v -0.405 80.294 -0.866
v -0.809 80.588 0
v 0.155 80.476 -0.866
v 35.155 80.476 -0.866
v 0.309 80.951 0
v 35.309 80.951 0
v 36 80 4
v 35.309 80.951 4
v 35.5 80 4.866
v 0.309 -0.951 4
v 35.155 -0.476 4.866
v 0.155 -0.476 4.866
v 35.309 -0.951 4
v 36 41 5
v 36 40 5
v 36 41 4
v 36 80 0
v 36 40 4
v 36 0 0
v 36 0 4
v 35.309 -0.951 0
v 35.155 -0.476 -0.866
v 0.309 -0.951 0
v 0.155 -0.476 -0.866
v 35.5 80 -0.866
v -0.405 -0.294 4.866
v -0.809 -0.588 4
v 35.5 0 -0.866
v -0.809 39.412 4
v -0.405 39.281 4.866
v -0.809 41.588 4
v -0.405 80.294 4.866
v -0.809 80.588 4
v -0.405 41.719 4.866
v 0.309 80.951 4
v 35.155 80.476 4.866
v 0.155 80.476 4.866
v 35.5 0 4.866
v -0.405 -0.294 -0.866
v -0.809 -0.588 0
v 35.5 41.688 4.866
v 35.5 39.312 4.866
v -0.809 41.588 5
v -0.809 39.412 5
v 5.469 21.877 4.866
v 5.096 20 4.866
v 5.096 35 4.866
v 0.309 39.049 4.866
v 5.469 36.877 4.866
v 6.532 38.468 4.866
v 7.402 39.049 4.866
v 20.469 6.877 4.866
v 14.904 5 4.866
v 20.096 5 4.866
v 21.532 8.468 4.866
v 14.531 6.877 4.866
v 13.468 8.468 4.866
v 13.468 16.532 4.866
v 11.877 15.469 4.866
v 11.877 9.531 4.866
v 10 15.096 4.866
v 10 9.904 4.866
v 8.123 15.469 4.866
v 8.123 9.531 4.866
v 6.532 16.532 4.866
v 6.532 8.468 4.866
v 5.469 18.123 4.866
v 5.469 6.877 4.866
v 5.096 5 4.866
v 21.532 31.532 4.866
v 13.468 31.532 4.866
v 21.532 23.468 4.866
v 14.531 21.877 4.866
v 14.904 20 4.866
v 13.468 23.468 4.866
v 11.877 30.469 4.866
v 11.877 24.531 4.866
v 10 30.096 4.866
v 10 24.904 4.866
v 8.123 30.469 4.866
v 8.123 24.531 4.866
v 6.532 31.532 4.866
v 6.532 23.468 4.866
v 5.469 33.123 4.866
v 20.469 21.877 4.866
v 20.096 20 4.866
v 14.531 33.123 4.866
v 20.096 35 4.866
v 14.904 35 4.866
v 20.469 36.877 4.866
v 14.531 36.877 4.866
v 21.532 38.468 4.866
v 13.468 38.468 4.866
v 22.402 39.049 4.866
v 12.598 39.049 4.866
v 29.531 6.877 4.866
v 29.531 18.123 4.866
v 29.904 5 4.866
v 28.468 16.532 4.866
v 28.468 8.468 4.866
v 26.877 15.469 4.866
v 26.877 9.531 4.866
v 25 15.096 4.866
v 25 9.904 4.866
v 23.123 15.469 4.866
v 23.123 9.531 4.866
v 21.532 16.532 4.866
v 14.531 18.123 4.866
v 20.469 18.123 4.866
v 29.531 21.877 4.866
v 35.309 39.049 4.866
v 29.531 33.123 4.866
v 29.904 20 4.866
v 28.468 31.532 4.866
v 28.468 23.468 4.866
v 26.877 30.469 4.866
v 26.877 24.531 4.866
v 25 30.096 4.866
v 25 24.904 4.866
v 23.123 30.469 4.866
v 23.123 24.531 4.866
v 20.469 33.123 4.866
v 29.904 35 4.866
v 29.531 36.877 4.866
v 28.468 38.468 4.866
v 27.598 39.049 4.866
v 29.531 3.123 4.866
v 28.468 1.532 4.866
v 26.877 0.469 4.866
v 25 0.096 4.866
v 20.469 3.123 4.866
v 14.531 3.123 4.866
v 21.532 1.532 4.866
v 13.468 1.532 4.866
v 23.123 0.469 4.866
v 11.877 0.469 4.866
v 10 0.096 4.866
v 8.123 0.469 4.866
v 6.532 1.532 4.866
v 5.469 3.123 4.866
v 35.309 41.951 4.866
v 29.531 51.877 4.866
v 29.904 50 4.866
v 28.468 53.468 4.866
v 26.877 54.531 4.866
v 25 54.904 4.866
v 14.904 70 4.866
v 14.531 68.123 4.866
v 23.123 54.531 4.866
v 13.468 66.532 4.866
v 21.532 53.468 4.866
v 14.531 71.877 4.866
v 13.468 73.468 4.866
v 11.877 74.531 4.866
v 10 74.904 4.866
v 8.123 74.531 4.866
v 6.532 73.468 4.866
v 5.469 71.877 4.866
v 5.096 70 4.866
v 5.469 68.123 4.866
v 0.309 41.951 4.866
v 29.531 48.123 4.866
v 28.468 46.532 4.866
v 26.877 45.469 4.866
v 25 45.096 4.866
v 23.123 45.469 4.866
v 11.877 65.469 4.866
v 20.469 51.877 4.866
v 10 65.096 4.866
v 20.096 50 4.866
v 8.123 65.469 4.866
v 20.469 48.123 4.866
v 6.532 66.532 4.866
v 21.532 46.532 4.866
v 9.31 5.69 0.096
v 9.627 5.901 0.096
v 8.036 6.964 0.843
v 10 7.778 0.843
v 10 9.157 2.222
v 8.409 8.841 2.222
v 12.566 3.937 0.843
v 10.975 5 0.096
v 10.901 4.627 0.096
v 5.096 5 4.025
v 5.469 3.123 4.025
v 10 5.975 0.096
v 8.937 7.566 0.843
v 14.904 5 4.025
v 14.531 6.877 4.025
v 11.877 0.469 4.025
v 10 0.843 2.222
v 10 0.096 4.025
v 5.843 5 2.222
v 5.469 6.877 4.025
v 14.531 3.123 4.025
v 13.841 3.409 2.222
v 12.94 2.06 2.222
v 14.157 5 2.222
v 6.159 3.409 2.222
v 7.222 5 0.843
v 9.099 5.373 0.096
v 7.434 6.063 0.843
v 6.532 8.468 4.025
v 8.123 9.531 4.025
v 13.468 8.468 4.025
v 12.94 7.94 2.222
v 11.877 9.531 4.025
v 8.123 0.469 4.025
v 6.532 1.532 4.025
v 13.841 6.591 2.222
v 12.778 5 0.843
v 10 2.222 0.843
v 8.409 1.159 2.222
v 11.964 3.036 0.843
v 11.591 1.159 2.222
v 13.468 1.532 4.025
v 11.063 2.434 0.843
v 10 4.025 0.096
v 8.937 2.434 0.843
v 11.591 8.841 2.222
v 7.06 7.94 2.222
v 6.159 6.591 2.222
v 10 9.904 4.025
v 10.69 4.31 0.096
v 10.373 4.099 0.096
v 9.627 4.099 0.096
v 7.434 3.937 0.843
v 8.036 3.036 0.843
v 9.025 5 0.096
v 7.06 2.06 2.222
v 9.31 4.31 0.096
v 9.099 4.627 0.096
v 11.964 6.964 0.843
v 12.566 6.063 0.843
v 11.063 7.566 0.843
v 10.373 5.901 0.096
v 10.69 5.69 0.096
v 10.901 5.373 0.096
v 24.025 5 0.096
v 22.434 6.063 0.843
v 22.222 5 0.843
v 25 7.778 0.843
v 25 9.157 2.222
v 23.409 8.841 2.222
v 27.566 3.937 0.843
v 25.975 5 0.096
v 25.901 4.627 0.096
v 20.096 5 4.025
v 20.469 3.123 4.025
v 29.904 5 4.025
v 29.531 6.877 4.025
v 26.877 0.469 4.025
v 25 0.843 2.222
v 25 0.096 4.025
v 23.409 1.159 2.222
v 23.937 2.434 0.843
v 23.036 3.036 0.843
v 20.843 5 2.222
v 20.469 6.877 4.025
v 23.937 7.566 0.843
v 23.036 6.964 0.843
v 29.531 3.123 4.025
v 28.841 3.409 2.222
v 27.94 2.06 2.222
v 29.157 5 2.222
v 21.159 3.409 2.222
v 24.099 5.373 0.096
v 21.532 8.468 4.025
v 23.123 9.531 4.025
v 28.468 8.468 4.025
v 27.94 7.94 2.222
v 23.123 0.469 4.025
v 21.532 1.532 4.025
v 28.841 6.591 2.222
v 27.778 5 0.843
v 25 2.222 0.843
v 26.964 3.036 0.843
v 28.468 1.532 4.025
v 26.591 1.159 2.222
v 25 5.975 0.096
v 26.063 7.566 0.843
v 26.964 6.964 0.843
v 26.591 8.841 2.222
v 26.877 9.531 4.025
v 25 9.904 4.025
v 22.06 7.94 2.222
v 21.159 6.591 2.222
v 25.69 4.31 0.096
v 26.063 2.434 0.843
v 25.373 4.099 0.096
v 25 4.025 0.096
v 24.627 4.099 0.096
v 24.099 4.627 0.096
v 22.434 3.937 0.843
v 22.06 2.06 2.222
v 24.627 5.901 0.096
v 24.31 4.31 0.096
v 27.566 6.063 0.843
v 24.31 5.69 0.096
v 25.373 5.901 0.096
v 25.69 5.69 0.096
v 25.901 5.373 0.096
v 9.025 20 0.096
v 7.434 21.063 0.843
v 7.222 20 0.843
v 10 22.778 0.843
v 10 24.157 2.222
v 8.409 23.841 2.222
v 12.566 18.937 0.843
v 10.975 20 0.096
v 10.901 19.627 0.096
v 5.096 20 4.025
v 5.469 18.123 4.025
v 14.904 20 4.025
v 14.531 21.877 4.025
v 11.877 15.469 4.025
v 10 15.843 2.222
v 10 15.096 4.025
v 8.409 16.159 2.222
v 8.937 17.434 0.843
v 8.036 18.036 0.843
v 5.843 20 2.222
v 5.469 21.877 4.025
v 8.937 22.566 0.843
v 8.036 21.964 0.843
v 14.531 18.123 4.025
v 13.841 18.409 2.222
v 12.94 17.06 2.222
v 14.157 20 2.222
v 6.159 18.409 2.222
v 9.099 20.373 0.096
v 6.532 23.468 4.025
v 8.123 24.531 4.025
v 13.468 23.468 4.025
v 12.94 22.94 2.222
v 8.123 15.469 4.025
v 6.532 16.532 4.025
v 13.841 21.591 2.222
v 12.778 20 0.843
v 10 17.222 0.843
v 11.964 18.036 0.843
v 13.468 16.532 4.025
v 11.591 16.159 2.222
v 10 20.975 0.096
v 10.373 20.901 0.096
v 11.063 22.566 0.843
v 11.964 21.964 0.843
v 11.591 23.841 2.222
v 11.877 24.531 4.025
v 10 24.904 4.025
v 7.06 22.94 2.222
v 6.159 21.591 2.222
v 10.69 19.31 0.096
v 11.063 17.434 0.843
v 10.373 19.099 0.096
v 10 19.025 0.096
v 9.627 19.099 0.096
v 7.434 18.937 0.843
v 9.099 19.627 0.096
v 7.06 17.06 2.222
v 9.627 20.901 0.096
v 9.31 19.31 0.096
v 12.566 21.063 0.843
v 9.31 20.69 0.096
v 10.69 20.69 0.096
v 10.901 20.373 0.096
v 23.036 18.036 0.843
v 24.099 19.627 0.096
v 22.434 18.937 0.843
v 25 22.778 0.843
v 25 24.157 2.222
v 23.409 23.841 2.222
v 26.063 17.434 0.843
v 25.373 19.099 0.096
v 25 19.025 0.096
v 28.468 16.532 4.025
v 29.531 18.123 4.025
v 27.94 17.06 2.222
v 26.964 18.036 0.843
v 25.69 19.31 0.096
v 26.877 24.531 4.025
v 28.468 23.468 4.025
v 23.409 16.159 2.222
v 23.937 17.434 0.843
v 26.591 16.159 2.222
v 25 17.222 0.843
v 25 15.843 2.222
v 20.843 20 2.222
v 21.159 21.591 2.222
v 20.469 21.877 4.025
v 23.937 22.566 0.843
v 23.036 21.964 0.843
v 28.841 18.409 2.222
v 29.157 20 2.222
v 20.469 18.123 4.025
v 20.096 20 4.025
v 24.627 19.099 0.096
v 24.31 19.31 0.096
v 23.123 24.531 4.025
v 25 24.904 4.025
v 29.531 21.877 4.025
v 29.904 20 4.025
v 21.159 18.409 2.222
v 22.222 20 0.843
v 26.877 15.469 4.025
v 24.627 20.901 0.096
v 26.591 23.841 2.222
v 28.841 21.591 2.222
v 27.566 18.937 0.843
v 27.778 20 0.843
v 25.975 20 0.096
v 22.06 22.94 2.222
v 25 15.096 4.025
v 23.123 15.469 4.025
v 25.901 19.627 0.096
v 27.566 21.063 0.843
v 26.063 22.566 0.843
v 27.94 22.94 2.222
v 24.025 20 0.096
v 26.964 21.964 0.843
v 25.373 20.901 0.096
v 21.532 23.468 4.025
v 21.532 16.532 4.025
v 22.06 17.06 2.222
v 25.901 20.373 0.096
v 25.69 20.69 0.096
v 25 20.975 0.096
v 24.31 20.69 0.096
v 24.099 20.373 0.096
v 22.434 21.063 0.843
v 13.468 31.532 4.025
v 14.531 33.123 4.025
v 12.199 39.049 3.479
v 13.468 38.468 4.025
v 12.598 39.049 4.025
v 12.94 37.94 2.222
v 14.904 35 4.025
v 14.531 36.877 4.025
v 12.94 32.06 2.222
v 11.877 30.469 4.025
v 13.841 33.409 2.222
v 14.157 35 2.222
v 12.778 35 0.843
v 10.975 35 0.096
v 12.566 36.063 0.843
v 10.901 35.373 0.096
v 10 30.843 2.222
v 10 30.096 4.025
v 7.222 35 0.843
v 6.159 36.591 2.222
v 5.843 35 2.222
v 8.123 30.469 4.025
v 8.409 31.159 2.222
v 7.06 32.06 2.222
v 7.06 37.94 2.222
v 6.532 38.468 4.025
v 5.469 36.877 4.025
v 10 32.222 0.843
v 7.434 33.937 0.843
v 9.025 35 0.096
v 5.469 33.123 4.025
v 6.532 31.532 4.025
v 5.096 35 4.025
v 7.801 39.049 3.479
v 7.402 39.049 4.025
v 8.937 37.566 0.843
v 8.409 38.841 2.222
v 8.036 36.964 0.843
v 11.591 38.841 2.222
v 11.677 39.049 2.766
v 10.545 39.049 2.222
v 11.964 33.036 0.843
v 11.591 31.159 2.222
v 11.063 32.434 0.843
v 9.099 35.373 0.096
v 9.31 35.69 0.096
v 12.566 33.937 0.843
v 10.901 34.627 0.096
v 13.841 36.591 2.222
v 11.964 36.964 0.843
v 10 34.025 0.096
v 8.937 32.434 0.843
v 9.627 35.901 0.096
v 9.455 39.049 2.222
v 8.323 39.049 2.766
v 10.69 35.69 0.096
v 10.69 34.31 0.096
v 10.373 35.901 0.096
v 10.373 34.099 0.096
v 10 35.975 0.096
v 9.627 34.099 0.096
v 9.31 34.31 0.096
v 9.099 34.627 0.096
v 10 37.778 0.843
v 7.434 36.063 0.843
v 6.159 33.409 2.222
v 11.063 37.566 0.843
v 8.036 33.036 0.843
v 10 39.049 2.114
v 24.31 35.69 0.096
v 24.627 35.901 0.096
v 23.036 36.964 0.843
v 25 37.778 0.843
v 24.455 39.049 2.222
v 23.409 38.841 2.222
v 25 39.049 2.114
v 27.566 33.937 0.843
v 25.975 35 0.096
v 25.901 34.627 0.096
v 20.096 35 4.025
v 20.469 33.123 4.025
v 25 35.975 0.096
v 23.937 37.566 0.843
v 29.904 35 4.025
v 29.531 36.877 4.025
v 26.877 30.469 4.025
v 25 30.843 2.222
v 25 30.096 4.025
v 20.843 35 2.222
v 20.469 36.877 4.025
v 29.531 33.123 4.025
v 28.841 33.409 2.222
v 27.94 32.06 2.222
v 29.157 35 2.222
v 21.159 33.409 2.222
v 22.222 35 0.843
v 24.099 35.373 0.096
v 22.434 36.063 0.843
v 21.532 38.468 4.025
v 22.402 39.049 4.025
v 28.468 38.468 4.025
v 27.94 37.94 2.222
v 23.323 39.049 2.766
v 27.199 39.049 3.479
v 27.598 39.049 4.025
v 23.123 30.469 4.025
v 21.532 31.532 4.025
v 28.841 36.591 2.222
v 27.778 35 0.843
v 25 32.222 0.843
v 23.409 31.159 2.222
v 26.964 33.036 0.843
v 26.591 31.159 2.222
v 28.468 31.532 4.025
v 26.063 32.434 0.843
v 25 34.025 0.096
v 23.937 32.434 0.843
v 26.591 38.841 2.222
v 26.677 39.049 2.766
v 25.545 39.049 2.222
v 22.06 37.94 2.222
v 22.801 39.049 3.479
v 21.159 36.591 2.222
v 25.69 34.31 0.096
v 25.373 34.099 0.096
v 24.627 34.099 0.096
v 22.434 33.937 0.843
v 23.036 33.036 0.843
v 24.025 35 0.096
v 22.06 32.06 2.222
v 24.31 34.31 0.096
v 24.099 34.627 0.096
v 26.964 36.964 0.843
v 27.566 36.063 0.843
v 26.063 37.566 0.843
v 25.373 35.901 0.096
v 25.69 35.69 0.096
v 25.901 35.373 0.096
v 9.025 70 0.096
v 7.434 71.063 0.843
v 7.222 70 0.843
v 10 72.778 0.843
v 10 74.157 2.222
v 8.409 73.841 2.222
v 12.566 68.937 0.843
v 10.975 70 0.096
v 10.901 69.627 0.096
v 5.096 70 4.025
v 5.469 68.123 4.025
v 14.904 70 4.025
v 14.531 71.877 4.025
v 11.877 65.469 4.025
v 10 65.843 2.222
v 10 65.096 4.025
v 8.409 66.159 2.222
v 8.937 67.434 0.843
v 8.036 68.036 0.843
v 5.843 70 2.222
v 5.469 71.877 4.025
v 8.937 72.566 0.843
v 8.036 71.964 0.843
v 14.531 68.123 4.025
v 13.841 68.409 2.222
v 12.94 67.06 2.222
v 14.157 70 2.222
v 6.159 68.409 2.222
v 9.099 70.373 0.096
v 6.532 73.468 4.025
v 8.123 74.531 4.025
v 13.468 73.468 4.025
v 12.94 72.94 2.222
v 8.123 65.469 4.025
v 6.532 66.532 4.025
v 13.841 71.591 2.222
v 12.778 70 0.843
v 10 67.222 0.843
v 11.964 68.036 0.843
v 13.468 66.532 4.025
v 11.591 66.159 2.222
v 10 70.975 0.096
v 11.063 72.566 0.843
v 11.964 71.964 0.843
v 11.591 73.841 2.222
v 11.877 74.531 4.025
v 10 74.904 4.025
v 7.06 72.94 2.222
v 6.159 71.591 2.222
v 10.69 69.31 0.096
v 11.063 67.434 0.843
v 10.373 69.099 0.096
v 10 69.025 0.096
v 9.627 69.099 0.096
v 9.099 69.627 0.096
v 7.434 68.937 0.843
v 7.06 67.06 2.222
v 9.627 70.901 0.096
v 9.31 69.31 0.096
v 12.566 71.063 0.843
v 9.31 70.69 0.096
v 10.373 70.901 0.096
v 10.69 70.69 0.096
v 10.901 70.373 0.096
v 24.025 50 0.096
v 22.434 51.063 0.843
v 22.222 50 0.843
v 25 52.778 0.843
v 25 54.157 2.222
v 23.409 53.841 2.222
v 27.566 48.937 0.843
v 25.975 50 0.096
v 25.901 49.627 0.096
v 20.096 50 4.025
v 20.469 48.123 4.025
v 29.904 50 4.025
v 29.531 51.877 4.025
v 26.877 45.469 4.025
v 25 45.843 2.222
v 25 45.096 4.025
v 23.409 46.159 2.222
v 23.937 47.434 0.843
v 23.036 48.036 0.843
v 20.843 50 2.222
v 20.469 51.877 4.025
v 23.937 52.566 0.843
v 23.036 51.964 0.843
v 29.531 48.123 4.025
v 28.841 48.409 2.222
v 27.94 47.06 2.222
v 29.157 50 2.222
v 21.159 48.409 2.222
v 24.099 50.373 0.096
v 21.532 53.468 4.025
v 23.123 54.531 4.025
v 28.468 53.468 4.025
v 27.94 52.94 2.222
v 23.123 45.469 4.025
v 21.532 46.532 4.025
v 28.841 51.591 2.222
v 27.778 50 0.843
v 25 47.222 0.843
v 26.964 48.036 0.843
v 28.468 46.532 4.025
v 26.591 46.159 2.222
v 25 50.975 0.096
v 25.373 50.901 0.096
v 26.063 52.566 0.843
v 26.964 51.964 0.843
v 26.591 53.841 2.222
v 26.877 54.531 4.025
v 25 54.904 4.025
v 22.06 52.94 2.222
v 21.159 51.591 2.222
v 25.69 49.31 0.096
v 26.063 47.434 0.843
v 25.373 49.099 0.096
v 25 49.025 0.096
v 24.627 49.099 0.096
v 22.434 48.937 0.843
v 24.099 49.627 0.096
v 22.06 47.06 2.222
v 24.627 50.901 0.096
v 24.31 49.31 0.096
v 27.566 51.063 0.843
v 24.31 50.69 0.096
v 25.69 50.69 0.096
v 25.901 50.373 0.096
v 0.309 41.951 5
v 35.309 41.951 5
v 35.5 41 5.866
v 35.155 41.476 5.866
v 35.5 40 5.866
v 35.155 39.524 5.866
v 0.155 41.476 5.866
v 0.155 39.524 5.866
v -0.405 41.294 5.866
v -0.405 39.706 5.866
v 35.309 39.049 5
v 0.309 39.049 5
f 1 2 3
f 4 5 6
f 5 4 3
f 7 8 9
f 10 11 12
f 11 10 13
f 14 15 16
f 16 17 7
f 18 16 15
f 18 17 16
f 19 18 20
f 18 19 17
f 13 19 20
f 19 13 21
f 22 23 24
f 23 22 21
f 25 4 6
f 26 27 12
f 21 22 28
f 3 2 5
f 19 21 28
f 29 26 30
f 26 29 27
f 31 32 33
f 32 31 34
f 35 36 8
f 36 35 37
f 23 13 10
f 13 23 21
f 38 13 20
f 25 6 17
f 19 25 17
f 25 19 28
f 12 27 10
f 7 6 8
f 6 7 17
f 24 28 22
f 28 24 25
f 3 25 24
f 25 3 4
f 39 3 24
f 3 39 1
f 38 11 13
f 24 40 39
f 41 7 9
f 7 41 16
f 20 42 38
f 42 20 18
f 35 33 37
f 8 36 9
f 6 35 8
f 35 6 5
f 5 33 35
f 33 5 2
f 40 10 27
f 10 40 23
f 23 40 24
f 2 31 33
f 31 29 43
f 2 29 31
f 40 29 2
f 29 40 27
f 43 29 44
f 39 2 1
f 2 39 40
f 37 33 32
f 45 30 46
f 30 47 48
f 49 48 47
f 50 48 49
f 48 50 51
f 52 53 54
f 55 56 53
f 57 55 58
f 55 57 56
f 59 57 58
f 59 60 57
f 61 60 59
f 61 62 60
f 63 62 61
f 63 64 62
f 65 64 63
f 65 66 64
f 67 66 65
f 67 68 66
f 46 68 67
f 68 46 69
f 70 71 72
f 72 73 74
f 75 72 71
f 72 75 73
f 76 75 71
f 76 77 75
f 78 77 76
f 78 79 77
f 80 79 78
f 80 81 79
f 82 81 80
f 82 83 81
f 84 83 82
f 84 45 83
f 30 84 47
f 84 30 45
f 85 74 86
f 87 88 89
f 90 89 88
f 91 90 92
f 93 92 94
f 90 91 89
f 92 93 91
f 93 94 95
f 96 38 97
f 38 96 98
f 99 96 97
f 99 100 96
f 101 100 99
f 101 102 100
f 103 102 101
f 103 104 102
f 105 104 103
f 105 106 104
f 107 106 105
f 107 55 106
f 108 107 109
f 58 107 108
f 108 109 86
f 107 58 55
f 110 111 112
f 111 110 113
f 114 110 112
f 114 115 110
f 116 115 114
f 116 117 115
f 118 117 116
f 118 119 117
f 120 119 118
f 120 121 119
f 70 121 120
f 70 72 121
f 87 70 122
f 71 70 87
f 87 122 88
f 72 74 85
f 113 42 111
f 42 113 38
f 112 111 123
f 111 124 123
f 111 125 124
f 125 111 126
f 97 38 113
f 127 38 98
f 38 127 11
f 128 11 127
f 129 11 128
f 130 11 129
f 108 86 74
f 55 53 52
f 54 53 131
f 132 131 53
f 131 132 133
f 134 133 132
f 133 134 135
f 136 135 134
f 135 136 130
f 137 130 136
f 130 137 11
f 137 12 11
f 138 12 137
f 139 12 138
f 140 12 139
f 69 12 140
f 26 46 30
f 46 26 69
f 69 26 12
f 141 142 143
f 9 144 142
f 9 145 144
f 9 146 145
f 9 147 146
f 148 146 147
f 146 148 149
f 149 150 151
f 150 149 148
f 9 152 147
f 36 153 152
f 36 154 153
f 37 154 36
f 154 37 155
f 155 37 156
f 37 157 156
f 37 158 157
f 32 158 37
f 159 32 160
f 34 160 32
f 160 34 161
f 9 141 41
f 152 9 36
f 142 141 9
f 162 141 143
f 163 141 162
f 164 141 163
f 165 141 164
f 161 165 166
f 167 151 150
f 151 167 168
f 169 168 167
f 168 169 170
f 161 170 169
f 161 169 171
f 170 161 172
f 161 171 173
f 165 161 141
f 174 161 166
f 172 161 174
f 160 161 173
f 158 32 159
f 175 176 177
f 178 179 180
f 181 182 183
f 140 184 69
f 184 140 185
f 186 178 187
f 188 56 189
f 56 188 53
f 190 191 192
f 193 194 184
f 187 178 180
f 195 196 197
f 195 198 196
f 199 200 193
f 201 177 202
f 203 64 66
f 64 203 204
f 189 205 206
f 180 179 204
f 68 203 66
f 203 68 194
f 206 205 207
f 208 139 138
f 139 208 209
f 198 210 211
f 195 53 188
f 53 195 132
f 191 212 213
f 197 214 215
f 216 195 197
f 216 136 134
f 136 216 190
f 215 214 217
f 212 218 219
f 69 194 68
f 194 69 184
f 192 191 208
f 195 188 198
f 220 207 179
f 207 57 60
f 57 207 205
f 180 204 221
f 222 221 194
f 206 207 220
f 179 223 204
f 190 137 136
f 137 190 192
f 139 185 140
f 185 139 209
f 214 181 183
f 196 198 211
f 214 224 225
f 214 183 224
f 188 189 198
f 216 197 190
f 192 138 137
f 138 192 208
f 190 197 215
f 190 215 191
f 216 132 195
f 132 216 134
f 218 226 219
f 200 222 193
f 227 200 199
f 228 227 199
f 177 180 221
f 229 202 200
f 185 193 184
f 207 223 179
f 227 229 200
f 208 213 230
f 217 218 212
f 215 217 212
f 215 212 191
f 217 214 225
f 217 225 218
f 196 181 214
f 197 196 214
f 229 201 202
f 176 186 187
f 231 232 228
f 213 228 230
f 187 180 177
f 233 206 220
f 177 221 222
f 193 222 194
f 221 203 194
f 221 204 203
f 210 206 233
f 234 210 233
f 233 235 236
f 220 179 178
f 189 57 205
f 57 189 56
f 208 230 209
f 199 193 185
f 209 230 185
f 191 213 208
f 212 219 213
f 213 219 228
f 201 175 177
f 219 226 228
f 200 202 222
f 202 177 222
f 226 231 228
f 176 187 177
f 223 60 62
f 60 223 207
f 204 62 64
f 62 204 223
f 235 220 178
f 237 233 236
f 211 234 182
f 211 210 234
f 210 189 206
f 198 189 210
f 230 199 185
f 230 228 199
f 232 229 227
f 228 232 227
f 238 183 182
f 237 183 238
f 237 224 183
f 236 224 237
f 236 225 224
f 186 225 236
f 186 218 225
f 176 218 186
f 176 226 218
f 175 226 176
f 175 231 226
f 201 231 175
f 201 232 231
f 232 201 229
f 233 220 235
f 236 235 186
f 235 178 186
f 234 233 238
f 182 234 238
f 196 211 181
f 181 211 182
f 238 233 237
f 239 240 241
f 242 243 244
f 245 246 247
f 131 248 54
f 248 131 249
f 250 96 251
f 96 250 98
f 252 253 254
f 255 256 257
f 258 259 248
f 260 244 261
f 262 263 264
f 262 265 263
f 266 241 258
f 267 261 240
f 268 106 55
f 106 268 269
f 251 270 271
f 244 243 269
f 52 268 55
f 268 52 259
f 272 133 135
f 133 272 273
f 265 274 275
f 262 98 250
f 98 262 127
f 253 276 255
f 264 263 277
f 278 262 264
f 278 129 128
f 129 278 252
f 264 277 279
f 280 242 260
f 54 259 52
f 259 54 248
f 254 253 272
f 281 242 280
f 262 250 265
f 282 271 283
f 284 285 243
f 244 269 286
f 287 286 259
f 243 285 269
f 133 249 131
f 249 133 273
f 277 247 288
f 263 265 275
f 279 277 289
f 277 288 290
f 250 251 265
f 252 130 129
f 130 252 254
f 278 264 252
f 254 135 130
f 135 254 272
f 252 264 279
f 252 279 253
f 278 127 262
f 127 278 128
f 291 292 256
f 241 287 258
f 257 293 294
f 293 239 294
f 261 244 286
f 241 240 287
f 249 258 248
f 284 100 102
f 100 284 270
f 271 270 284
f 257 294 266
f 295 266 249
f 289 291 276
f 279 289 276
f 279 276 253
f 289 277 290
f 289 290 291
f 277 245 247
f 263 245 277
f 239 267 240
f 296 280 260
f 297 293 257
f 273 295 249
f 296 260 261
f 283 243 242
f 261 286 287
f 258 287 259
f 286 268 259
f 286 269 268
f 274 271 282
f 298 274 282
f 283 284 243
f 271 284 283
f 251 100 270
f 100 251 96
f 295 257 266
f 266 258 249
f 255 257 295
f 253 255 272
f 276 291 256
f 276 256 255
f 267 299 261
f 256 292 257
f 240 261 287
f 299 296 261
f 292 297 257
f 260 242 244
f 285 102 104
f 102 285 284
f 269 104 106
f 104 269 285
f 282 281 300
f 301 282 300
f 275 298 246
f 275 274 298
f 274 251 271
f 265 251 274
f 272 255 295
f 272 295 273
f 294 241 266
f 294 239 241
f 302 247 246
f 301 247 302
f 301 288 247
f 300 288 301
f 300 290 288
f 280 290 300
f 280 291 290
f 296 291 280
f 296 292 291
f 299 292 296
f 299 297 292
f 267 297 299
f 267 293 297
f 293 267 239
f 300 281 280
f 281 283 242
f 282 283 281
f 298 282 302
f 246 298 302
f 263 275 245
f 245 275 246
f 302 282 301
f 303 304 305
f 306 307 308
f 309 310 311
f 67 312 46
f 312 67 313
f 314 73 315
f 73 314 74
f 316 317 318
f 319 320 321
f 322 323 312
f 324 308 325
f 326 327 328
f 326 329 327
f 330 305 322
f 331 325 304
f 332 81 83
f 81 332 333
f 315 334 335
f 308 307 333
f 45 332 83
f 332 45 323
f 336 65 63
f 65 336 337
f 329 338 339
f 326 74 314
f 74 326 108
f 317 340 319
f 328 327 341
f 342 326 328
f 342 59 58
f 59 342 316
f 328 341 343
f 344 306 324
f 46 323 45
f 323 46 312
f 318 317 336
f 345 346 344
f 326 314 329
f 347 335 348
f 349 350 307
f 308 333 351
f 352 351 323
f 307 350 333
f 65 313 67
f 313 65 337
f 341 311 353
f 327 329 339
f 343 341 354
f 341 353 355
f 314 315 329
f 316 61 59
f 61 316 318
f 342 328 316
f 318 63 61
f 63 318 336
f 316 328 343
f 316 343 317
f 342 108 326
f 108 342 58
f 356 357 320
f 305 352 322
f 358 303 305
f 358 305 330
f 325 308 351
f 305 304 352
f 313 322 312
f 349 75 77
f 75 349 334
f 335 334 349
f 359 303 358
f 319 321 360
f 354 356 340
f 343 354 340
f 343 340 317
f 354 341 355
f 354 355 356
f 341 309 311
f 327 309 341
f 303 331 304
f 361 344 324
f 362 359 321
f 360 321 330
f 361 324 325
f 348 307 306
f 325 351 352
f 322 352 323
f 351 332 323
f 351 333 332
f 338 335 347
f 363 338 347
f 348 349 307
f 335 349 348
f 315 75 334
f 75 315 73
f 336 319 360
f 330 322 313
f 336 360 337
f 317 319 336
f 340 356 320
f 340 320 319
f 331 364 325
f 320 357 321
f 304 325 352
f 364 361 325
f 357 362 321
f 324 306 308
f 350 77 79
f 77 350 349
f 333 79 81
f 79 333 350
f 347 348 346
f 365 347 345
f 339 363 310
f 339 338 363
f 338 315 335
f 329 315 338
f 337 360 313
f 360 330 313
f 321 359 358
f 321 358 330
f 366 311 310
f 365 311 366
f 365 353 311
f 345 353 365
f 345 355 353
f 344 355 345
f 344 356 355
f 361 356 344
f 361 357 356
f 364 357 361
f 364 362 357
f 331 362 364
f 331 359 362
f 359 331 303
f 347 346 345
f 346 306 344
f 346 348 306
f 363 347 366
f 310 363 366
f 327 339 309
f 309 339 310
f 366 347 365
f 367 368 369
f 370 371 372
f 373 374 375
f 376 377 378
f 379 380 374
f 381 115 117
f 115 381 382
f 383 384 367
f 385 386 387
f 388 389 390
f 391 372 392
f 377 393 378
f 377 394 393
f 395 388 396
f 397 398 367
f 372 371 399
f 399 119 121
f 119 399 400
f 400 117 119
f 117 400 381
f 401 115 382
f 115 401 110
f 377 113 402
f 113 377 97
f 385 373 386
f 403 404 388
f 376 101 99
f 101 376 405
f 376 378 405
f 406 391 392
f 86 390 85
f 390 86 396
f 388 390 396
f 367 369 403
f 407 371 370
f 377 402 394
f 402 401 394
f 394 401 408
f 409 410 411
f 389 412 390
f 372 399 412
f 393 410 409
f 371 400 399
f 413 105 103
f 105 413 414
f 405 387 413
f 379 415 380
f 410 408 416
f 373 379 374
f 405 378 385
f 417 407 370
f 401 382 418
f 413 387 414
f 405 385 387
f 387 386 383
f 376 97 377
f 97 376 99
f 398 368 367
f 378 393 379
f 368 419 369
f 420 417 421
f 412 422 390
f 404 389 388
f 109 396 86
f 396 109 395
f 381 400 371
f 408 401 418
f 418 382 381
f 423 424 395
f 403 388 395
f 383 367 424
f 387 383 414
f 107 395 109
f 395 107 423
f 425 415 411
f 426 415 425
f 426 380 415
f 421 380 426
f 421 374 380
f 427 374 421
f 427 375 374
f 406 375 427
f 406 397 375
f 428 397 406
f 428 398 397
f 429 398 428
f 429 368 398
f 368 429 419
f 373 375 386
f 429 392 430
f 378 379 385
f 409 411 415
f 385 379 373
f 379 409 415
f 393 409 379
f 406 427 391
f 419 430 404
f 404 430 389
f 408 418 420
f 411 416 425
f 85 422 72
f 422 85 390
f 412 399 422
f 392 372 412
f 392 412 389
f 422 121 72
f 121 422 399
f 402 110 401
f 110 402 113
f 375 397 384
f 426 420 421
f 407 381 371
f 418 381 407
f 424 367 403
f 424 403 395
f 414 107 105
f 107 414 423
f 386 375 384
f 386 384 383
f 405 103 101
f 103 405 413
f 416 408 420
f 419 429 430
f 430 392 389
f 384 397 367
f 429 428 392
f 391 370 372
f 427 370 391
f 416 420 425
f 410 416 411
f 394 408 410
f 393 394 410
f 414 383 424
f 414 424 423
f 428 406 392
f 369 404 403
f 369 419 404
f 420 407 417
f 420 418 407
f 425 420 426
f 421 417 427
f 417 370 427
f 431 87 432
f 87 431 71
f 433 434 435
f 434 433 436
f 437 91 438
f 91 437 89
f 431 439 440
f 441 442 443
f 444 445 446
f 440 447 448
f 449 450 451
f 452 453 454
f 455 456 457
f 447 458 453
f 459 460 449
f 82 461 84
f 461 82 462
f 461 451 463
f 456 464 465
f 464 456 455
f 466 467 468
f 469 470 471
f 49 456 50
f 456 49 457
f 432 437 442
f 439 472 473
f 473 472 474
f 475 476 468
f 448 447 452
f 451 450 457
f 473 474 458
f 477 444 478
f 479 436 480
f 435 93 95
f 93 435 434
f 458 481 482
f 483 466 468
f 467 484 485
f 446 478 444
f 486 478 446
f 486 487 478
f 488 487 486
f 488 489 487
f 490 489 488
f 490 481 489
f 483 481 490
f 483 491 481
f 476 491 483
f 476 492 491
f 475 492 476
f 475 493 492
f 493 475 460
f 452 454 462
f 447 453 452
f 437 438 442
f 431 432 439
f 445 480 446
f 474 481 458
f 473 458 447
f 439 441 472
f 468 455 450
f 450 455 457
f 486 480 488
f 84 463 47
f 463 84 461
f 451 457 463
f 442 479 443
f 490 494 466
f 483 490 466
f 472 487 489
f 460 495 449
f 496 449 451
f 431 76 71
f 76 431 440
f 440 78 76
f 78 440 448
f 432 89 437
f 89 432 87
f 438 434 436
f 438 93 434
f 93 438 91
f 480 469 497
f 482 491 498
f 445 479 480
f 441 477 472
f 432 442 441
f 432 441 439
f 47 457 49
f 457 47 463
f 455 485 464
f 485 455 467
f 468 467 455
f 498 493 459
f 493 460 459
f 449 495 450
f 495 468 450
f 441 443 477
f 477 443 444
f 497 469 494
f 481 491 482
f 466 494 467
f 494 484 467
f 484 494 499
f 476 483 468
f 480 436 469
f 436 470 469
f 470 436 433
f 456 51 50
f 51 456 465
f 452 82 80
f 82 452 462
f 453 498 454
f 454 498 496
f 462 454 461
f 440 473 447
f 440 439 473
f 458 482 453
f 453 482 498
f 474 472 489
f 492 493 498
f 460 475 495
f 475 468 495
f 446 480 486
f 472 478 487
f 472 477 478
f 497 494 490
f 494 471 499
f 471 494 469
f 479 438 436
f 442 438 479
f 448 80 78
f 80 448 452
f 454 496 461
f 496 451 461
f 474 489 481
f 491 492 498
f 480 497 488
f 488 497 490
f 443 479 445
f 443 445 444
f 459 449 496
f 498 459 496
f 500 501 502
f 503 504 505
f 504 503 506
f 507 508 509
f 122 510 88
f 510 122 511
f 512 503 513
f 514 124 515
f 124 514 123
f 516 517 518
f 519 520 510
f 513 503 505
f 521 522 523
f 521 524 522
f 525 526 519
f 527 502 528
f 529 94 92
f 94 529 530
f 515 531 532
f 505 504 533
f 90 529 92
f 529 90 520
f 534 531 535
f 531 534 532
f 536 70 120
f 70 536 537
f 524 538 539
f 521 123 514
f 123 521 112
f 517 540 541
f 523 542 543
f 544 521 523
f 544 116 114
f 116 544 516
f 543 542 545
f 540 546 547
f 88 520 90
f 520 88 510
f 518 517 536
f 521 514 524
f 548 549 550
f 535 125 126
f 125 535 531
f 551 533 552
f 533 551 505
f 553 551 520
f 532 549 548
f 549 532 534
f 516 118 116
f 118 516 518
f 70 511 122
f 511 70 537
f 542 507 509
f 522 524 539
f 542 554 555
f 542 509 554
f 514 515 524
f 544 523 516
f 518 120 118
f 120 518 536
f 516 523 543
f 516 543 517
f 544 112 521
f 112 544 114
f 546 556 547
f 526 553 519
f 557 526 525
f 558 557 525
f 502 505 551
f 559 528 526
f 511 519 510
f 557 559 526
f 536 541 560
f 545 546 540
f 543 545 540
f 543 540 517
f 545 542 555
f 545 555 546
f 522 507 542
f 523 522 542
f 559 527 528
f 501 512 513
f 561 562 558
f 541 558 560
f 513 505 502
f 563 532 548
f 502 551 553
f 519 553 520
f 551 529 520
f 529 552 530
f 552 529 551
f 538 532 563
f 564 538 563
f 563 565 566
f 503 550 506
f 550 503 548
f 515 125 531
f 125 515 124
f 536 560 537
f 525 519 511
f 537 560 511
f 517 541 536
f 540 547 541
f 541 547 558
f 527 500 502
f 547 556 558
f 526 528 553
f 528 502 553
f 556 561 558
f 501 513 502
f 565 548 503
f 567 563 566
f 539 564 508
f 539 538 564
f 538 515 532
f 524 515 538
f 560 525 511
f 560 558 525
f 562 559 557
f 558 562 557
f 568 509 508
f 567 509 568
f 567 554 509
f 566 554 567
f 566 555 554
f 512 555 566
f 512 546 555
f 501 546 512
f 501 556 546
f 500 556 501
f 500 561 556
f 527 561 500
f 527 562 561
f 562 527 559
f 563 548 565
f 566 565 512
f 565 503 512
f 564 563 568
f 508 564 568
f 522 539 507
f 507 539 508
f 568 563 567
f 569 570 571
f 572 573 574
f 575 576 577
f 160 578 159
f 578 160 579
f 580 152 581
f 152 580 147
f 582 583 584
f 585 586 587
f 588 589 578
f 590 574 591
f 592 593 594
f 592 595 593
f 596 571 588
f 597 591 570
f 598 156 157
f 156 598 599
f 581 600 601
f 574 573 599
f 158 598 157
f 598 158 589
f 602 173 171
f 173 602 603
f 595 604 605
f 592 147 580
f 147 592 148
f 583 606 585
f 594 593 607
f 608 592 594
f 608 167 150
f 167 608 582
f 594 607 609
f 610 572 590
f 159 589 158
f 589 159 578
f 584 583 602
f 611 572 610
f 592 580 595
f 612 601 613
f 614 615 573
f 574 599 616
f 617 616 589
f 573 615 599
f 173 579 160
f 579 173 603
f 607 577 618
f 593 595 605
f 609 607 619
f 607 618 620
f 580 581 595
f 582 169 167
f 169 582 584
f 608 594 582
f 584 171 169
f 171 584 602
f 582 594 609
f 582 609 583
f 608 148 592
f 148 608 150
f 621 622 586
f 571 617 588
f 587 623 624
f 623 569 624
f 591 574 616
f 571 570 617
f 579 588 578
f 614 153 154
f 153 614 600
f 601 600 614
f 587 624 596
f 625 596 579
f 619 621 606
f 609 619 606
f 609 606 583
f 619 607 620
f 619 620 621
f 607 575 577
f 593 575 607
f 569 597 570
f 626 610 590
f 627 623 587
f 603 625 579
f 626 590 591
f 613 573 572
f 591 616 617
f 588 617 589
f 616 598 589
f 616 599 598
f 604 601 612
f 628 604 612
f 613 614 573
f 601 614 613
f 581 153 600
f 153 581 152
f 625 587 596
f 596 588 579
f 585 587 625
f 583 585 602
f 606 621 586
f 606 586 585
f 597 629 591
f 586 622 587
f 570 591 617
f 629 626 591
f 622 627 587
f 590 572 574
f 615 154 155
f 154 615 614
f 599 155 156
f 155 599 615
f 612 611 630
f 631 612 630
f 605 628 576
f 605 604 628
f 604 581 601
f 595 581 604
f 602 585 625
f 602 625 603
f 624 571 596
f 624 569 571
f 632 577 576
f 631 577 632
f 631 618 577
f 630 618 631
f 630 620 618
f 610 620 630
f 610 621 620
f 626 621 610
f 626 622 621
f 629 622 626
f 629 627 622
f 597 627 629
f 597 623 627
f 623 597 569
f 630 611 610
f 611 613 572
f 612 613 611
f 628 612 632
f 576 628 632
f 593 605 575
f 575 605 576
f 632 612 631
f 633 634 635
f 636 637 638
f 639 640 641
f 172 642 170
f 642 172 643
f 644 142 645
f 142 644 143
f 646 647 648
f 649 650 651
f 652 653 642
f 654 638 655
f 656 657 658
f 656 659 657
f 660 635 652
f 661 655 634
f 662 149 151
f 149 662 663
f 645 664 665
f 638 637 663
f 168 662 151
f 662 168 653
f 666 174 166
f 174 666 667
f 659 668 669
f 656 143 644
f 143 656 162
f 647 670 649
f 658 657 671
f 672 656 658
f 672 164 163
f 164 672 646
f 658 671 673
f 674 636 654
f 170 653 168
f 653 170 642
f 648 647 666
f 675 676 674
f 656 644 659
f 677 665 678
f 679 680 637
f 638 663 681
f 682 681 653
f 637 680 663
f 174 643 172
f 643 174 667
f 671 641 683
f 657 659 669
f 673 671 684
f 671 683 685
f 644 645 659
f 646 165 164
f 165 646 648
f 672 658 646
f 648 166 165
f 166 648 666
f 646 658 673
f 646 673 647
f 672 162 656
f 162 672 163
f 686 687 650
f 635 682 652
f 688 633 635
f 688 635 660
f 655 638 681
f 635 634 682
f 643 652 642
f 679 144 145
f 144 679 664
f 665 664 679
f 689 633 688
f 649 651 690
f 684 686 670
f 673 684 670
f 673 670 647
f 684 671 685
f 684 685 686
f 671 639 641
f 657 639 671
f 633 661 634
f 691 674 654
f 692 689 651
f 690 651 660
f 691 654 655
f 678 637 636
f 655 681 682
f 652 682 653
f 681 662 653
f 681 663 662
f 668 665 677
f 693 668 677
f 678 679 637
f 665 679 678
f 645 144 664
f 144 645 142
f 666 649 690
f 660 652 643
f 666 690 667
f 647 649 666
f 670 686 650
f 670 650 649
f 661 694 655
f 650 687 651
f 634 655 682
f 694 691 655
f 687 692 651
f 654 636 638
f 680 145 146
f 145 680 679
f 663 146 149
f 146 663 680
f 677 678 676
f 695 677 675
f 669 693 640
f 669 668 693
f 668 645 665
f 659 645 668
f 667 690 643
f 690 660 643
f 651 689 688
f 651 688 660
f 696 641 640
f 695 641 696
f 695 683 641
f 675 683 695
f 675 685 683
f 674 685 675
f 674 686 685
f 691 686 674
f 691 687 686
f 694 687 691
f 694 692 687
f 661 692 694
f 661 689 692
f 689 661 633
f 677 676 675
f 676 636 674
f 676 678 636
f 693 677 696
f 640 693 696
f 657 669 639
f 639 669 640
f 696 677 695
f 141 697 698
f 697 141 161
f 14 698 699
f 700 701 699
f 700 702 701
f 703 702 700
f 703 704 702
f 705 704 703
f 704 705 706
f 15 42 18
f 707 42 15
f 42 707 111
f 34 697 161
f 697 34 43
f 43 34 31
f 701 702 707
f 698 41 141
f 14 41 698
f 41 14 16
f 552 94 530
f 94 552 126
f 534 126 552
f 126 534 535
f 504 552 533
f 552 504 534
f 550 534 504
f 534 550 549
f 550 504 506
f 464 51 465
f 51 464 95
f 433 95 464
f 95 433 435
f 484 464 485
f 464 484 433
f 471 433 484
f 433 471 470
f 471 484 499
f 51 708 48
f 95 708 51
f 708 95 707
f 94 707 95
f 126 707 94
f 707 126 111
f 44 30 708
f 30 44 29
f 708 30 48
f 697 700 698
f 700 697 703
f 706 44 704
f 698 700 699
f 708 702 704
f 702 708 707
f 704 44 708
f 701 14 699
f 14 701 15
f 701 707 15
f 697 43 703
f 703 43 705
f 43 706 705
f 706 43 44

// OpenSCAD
// Loguncov Maxim 13.12.13


//$fn=128;


translate([0,40,0])
minkowski()
{cube([35,1,5]);
sphere(1);
}

difference() {

//основа
minkowski()
{cube([35,80,4]);
sphere(1);
}

//отверстия
translate([10,5,5])sphere(5);
translate([25,5,5])sphere(5);
translate([10,20,5])sphere(5);
translate([25,20,5])sphere(5);
translate([10,35,5])sphere(5);
translate([25,35,5])sphere(5);

translate([10,70,5])sphere(5);
translate([25,50,5])sphere(5);



}
